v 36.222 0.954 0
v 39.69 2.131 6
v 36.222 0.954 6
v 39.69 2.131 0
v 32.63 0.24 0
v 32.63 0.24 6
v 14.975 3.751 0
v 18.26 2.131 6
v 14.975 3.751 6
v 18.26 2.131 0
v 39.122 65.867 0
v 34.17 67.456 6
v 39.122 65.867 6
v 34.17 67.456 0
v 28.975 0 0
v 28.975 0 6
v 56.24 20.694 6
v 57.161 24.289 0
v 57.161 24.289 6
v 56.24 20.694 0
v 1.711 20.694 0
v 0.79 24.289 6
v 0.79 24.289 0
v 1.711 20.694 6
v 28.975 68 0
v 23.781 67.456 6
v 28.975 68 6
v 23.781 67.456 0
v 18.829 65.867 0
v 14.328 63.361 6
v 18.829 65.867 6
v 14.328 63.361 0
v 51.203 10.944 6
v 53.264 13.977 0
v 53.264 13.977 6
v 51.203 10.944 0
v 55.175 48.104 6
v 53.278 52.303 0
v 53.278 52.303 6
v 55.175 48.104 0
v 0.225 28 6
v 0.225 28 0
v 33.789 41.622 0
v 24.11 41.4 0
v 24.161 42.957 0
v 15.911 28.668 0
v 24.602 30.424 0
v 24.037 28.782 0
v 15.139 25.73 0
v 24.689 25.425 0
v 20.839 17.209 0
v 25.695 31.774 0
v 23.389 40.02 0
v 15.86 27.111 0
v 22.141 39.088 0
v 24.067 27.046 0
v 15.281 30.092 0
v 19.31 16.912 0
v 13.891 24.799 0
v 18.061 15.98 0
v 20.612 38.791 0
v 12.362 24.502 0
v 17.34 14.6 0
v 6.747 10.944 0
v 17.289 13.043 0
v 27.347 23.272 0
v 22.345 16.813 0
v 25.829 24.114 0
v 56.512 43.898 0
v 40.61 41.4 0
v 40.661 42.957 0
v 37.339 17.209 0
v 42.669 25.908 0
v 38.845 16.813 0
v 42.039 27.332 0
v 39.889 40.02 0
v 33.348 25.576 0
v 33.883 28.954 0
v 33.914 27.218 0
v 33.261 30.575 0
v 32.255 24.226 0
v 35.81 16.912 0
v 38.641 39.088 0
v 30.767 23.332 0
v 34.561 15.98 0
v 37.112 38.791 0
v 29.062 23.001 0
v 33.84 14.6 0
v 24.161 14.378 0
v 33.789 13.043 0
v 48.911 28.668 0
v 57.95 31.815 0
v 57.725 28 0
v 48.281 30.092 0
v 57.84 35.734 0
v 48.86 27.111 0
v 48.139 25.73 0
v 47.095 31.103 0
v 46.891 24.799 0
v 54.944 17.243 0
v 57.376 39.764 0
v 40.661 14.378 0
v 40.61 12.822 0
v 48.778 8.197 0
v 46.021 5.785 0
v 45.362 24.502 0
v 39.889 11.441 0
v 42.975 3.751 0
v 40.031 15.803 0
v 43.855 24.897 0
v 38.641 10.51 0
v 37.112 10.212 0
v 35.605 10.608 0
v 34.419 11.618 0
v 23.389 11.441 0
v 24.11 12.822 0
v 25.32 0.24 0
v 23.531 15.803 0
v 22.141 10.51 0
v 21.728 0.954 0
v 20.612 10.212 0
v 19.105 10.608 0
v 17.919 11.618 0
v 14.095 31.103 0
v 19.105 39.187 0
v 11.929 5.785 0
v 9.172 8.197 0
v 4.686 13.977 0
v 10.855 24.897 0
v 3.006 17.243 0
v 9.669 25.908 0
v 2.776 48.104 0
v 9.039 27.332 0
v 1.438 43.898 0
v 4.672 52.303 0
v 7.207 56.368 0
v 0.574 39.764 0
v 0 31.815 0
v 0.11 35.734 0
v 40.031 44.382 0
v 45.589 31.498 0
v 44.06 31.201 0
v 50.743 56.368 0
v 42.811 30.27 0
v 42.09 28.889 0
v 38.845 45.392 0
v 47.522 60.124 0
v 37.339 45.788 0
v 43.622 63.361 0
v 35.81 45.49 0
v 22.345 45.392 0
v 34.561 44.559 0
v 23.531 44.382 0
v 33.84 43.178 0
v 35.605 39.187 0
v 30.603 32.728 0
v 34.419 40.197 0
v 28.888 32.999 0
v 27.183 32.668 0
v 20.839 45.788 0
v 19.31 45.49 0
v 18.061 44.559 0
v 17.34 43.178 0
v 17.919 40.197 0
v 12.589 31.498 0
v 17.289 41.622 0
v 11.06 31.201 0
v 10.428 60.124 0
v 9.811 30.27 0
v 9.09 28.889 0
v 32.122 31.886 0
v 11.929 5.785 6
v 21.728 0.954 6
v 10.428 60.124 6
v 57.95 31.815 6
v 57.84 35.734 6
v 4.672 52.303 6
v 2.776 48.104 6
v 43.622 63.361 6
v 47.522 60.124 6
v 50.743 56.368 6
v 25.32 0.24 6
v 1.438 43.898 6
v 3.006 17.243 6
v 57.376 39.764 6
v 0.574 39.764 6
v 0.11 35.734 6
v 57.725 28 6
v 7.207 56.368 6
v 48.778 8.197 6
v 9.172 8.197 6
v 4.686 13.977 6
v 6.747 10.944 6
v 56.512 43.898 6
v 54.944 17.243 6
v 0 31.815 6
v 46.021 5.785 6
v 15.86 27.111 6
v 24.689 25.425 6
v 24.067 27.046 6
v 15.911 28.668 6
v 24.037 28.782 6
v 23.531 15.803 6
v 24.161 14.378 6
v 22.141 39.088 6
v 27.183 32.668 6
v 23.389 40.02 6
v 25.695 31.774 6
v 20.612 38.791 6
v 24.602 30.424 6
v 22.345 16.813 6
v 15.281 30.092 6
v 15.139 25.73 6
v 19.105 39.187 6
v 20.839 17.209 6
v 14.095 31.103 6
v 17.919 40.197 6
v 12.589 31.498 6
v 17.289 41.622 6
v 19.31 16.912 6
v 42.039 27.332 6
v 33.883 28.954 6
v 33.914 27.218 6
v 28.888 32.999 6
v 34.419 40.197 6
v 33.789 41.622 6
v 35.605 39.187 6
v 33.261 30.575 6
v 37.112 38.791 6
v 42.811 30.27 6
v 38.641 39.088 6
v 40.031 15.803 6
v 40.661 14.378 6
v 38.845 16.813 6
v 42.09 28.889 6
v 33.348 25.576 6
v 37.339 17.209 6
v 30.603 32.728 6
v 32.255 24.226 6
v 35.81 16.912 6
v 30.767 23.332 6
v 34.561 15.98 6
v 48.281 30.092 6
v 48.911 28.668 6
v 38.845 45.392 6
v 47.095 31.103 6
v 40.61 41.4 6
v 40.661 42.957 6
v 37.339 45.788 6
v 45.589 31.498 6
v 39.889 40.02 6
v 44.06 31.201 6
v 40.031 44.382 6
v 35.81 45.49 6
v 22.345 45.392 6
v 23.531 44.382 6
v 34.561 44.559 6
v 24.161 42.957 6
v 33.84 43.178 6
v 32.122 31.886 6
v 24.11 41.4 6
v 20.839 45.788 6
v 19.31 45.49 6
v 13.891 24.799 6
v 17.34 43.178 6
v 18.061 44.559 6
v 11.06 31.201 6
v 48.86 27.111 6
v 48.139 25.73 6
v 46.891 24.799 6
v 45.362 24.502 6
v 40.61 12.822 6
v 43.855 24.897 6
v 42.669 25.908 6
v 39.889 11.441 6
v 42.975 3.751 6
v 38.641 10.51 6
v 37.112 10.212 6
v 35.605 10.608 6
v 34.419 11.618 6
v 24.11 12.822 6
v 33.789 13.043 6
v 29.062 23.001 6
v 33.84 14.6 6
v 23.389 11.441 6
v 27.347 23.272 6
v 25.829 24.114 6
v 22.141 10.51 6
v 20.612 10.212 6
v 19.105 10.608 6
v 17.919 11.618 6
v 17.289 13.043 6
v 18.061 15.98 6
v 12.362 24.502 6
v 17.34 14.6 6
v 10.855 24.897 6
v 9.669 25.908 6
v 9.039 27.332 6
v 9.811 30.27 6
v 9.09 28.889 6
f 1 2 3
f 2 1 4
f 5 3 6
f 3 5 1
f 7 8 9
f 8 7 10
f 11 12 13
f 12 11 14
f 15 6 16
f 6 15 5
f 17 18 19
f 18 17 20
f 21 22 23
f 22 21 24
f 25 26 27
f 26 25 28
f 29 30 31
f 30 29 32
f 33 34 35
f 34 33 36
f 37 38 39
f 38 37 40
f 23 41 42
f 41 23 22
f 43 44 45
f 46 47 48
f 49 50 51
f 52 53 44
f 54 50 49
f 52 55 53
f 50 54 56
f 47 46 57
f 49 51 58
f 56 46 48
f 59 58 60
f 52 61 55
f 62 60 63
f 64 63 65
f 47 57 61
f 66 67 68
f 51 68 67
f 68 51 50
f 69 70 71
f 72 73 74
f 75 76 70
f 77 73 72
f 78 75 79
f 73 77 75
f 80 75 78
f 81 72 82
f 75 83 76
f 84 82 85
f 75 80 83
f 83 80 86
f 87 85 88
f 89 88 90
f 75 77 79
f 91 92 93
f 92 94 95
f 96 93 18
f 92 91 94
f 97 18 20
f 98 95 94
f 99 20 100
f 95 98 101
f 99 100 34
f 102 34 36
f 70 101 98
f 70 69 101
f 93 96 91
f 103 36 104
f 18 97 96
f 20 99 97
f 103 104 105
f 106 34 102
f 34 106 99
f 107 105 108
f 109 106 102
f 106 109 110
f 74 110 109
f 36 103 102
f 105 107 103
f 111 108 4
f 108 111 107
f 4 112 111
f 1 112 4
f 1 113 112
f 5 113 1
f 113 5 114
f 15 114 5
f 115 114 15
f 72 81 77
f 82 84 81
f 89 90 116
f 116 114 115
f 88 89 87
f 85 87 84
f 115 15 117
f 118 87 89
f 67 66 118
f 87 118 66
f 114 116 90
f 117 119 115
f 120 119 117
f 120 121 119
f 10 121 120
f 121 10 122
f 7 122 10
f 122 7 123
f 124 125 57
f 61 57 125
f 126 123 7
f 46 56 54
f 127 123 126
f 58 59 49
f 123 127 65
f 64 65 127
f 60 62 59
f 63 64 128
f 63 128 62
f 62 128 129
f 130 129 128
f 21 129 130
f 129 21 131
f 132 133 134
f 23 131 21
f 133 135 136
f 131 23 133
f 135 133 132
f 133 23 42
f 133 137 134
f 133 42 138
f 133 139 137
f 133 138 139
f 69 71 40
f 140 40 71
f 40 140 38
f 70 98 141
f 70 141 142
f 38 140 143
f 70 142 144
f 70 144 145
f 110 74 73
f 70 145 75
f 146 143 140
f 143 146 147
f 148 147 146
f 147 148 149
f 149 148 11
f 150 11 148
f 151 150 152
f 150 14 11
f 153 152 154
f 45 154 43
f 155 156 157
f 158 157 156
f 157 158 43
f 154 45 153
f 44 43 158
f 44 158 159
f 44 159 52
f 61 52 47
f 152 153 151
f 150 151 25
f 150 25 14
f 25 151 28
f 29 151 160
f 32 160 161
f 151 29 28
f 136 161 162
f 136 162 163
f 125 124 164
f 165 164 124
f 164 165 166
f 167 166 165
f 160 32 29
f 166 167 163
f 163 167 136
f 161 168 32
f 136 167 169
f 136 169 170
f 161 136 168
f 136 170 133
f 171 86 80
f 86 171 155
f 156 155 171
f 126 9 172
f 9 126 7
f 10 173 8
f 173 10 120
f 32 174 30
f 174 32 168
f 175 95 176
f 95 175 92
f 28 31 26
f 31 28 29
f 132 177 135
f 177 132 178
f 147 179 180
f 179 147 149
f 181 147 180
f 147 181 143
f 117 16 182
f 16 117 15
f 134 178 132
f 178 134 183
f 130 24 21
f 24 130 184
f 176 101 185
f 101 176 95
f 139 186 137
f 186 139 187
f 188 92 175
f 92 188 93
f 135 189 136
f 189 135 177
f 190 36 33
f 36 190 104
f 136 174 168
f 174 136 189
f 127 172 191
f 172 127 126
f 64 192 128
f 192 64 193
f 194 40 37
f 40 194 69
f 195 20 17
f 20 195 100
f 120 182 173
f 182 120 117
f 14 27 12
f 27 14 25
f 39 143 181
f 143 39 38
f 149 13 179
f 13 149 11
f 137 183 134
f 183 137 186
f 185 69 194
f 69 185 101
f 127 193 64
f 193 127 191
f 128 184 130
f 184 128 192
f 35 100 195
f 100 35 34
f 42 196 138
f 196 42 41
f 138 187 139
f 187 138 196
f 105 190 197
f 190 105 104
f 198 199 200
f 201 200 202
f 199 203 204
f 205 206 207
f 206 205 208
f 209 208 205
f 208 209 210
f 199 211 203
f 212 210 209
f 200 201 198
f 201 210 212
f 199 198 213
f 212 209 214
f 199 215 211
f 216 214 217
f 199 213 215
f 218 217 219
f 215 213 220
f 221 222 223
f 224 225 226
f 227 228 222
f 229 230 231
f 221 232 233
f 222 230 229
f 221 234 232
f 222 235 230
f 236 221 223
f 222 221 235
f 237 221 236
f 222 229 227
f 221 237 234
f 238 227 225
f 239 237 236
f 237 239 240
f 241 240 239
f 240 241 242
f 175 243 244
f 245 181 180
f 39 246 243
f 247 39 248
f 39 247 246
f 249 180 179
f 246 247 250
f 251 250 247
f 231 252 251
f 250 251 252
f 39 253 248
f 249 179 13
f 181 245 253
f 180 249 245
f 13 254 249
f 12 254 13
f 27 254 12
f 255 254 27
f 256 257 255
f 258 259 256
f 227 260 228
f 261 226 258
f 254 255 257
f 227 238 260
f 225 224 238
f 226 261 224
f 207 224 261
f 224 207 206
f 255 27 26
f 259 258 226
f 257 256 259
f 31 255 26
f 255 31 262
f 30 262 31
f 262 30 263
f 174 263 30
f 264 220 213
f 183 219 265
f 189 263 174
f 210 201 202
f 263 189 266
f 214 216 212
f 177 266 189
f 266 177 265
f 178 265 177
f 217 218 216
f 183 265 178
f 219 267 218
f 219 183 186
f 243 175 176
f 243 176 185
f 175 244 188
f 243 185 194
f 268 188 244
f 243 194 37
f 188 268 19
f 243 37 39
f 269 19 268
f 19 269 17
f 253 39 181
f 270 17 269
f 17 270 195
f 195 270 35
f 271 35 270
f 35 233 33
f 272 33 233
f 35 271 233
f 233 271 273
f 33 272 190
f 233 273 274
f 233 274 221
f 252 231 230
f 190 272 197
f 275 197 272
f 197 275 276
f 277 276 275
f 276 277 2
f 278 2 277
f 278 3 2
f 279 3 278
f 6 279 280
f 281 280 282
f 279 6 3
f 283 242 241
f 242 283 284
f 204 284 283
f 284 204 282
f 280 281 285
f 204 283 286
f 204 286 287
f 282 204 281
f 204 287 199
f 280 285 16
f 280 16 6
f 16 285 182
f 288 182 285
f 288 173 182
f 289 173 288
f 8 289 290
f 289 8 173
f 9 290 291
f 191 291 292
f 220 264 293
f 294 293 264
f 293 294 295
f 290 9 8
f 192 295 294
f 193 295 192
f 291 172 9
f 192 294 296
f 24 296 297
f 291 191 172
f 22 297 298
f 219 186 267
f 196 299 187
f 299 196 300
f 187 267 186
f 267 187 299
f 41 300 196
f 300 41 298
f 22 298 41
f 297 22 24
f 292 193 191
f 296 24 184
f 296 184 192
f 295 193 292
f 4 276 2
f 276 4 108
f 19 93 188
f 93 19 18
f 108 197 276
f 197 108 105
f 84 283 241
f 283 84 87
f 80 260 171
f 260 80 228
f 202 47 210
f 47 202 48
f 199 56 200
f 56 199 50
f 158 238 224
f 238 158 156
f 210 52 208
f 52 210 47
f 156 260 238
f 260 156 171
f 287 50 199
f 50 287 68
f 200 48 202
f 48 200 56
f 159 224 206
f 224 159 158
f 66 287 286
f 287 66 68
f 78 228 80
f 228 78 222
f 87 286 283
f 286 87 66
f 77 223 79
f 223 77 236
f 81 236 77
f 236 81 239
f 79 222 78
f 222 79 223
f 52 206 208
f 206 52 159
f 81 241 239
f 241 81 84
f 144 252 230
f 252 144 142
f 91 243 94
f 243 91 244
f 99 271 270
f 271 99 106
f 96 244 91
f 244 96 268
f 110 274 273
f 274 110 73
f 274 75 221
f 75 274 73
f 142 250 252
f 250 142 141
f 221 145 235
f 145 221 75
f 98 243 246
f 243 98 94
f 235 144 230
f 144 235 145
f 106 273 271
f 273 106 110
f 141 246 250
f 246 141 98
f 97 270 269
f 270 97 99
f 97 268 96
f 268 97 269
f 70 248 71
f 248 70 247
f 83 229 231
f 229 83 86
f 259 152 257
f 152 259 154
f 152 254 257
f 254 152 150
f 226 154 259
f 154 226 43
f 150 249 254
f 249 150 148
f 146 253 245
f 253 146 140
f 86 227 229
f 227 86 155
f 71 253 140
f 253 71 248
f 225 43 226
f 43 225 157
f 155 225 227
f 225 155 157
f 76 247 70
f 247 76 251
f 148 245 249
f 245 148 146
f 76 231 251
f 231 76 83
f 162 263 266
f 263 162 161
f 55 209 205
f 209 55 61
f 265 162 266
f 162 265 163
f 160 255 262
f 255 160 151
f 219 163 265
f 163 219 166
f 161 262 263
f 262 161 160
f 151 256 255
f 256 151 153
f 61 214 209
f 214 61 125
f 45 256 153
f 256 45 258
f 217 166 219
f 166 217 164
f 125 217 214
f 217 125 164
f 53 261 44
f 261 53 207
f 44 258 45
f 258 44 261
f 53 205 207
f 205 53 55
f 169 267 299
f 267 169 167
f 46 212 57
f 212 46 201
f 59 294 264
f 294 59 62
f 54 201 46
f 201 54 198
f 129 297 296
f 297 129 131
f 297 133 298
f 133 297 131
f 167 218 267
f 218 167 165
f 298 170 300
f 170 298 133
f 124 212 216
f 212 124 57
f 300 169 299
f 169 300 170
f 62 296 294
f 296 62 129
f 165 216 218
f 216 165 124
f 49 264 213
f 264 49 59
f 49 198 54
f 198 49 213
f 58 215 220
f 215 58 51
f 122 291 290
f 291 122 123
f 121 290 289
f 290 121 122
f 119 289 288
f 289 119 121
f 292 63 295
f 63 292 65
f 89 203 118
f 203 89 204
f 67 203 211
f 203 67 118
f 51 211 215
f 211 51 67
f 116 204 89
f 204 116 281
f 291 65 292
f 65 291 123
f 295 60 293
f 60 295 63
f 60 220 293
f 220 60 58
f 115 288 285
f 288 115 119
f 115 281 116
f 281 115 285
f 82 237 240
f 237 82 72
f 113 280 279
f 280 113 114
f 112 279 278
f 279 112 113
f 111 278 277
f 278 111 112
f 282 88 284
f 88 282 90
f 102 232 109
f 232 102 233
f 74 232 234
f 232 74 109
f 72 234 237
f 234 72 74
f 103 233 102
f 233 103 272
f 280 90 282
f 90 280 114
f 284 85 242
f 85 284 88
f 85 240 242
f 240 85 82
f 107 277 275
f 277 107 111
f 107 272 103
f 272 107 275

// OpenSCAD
$fn = 32;

// ----------------------------------------------------------------------
// Cam plate: single_lobe cam, base R28
// ----------------------------------------------------------------------

// --- parameters (mm) ---
base_r = 28;              // base circle radius
lobe_h = 12;              // cam lobe rise
bore_r = 5;               // shaft bore radius
plate_t = 6;              // plate thickness, Z (extrusion height)
ring_r = 16.5;            // lightening ring radius
bolt_r = 3.5;             // lightening hole radius

profile = [[57.725, 28], [57.95, 31.815], [57.84, 35.734], [57.376, 39.764], [56.512, 43.898], [55.175, 48.104], [53.278, 52.303], [50.743, 56.368], [47.522, 60.124], [43.622, 63.361], [39.122, 65.867], [34.17, 67.456], [28.975, 68], [23.781, 67.456], [18.829, 65.867], [14.328, 63.361], [10.428, 60.124], [7.207, 56.368], [4.672, 52.303], [2.776, 48.104], [1.438, 43.898], [0.574, 39.764], [0.11, 35.734], [0, 31.815], [0.225, 28], [0.79, 24.289], [1.711, 20.694], [3.006, 17.243], [4.686, 13.977], [6.747, 10.944], [9.172, 8.197], [11.929, 5.785], [14.975, 3.751], [18.26, 2.131], [21.728, 0.954], [25.32, 0.24], [28.975, 0], [32.63, 0.24], [36.222, 0.954], [39.69, 2.131], [42.975, 3.751], [46.021, 5.785], [48.778, 8.197], [51.203, 10.944], [53.264, 13.977], [54.944, 17.243], [56.24, 20.694], [57.161, 24.289]];  // primary outline, 48 points, counter clockwise
void_1 = [[33.883, 28.954], [33.261, 30.575], [32.122, 31.886], [30.603, 32.728], [28.888, 32.999], [27.183, 32.668], [25.695, 31.774], [24.602, 30.424], [24.037, 28.782], [24.067, 27.046], [24.689, 25.425], [25.829, 24.114], [27.347, 23.272], [29.062, 23.001], [30.767, 23.332], [32.255, 24.226], [33.348, 25.576], [33.914, 27.218]];  // shaft bore, 18 points
void_2 = [[48.911, 28.668], [48.281, 30.092], [47.095, 31.103], [45.589, 31.498], [44.06, 31.201], [42.811, 30.27], [42.09, 28.889], [42.039, 27.332], [42.669, 25.908], [43.855, 24.897], [45.362, 24.502], [46.891, 24.799], [48.139, 25.73], [48.86, 27.111]];  // lightening hole 1, 14 points
void_3 = [[40.661, 42.957], [40.031, 44.382], [38.845, 45.392], [37.339, 45.788], [35.81, 45.49], [34.561, 44.559], [33.84, 43.178], [33.789, 41.622], [34.419, 40.197], [35.605, 39.187], [37.112, 38.791], [38.641, 39.088], [39.889, 40.02], [40.61, 41.4]];  // lightening hole 2, 14 points
void_4 = [[24.161, 42.957], [23.531, 44.382], [22.345, 45.392], [20.839, 45.788], [19.31, 45.49], [18.061, 44.559], [17.34, 43.178], [17.289, 41.622], [17.919, 40.197], [19.105, 39.187], [20.612, 38.791], [22.141, 39.088], [23.389, 40.02], [24.11, 41.4]];  // lightening hole 3, 14 points
void_5 = [[15.911, 28.668], [15.281, 30.092], [14.095, 31.103], [12.589, 31.498], [11.06, 31.201], [9.811, 30.27], [9.09, 28.889], [9.039, 27.332], [9.669, 25.908], [10.855, 24.897], [12.362, 24.502], [13.891, 24.799], [15.139, 25.73], [15.86, 27.111]];  // lightening hole 4, 14 points
void_6 = [[24.161, 14.378], [23.531, 15.803], [22.345, 16.813], [20.839, 17.209], [19.31, 16.912], [18.061, 15.98], [17.34, 14.6], [17.289, 13.043], [17.919, 11.618], [19.105, 10.608], [20.612, 10.212], [22.141, 10.51], [23.389, 11.441], [24.11, 12.822]];  // lightening hole 5, 14 points
void_7 = [[40.661, 14.378], [40.031, 15.803], [38.845, 16.813], [37.339, 17.209], [35.81, 16.912], [34.561, 15.98], [33.84, 14.6], [33.789, 13.043], [34.419, 11.618], [35.605, 10.608], [37.112, 10.212], [38.641, 10.51], [39.889, 11.441], [40.61, 12.822]];  // lightening hole 6, 14 points

// --- the one profile operation ---
difference() {
  linear_extrude(height = plate_t) polygon(points = profile);
  translate([0, 0, -1])
    linear_extrude(height = plate_t + 2) polygon(points = void_1);
  translate([0, 0, -1])
    linear_extrude(height = plate_t + 2) polygon(points = void_2);
  translate([0, 0, -1])
    linear_extrude(height = plate_t + 2) polygon(points = void_3);
  translate([0, 0, -1])
    linear_extrude(height = plate_t + 2) polygon(points = void_4);
  translate([0, 0, -1])
    linear_extrude(height = plate_t + 2) polygon(points = void_5);
  translate([0, 0, -1])
    linear_extrude(height = plate_t + 2) polygon(points = void_6);
  translate([0, 0, -1])
    linear_extrude(height = plate_t + 2) polygon(points = void_7);
}
